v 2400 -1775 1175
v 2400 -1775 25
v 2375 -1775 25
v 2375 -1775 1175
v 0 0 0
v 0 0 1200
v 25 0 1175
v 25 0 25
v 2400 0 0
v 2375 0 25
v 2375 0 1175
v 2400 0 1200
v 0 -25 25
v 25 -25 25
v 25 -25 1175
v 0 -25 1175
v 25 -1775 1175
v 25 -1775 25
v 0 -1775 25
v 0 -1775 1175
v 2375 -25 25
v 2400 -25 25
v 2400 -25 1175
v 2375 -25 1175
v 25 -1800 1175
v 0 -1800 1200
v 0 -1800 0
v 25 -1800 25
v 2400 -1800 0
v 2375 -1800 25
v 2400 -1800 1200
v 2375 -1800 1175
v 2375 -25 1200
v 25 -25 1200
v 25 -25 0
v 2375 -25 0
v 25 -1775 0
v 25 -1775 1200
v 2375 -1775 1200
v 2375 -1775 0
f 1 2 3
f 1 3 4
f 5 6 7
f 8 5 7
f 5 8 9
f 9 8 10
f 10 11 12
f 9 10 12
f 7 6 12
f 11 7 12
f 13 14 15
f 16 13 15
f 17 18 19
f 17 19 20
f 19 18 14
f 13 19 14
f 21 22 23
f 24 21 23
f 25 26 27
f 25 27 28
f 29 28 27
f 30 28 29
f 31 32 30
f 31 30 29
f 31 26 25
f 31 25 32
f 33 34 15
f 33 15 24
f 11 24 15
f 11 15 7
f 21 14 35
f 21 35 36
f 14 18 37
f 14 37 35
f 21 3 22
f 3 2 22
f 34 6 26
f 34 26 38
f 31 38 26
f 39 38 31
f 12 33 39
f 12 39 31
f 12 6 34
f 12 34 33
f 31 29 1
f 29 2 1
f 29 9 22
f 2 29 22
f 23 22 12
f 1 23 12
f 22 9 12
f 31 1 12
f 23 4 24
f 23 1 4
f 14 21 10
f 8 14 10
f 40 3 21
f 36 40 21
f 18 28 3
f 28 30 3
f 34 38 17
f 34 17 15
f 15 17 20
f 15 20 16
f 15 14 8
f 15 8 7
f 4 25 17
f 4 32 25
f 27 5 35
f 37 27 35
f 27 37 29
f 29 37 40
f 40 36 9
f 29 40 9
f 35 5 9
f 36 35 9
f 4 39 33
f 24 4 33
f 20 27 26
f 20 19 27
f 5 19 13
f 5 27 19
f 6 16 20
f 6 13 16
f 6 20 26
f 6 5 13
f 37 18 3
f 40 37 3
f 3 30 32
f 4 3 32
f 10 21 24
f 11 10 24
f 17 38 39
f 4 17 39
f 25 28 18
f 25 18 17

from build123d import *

# Parameters (mm, degrees)
F0_W     = 2400
F0_H     = 1200
F1_DEPTH = 1800
F2_W     = 2350
F2_H     = 1150
F3_DEPTH = 1800.001
F4_W     = 1750
F4_H     = 1150
F5_DEPTH = 2400.001
F6_W     = 2350
F6_H     = 1750
F7_DEPTH = 1200.001


with BuildPart() as f1:
    # F0 (on Front) → F1 (new body)
    with BuildSketch(Plane.XZ):
        with Locations((1200, 600)):
            Rectangle(F0_W, F0_H)
    extrude(amount=F1_DEPTH)

    # F2 (on face) → F3 (cut, through all)
    with BuildSketch(Plane.XZ.offset(1800)):
        with Locations((1200, 600)):
            Rectangle(F2_W, F2_H)
    extrude(amount=-F3_DEPTH, mode=Mode.SUBTRACT)

    # F4 (on face) → F5 (cut, through all)
    with BuildSketch(Plane.YZ.offset(2400)):
        with Locations((-900, 600)):
            Rectangle(F4_W, F4_H)
    extrude(amount=-F5_DEPTH, mode=Mode.SUBTRACT)

    # F6 (on face) → F7 (cut, through all)
    with BuildSketch(Plane.XY.offset(1200)):
        with Locations((1200, -900)):
            Rectangle(F6_W, F6_H)
    extrude(amount=-F7_DEPTH, mode=Mode.SUBTRACT)


solid = f1.part
